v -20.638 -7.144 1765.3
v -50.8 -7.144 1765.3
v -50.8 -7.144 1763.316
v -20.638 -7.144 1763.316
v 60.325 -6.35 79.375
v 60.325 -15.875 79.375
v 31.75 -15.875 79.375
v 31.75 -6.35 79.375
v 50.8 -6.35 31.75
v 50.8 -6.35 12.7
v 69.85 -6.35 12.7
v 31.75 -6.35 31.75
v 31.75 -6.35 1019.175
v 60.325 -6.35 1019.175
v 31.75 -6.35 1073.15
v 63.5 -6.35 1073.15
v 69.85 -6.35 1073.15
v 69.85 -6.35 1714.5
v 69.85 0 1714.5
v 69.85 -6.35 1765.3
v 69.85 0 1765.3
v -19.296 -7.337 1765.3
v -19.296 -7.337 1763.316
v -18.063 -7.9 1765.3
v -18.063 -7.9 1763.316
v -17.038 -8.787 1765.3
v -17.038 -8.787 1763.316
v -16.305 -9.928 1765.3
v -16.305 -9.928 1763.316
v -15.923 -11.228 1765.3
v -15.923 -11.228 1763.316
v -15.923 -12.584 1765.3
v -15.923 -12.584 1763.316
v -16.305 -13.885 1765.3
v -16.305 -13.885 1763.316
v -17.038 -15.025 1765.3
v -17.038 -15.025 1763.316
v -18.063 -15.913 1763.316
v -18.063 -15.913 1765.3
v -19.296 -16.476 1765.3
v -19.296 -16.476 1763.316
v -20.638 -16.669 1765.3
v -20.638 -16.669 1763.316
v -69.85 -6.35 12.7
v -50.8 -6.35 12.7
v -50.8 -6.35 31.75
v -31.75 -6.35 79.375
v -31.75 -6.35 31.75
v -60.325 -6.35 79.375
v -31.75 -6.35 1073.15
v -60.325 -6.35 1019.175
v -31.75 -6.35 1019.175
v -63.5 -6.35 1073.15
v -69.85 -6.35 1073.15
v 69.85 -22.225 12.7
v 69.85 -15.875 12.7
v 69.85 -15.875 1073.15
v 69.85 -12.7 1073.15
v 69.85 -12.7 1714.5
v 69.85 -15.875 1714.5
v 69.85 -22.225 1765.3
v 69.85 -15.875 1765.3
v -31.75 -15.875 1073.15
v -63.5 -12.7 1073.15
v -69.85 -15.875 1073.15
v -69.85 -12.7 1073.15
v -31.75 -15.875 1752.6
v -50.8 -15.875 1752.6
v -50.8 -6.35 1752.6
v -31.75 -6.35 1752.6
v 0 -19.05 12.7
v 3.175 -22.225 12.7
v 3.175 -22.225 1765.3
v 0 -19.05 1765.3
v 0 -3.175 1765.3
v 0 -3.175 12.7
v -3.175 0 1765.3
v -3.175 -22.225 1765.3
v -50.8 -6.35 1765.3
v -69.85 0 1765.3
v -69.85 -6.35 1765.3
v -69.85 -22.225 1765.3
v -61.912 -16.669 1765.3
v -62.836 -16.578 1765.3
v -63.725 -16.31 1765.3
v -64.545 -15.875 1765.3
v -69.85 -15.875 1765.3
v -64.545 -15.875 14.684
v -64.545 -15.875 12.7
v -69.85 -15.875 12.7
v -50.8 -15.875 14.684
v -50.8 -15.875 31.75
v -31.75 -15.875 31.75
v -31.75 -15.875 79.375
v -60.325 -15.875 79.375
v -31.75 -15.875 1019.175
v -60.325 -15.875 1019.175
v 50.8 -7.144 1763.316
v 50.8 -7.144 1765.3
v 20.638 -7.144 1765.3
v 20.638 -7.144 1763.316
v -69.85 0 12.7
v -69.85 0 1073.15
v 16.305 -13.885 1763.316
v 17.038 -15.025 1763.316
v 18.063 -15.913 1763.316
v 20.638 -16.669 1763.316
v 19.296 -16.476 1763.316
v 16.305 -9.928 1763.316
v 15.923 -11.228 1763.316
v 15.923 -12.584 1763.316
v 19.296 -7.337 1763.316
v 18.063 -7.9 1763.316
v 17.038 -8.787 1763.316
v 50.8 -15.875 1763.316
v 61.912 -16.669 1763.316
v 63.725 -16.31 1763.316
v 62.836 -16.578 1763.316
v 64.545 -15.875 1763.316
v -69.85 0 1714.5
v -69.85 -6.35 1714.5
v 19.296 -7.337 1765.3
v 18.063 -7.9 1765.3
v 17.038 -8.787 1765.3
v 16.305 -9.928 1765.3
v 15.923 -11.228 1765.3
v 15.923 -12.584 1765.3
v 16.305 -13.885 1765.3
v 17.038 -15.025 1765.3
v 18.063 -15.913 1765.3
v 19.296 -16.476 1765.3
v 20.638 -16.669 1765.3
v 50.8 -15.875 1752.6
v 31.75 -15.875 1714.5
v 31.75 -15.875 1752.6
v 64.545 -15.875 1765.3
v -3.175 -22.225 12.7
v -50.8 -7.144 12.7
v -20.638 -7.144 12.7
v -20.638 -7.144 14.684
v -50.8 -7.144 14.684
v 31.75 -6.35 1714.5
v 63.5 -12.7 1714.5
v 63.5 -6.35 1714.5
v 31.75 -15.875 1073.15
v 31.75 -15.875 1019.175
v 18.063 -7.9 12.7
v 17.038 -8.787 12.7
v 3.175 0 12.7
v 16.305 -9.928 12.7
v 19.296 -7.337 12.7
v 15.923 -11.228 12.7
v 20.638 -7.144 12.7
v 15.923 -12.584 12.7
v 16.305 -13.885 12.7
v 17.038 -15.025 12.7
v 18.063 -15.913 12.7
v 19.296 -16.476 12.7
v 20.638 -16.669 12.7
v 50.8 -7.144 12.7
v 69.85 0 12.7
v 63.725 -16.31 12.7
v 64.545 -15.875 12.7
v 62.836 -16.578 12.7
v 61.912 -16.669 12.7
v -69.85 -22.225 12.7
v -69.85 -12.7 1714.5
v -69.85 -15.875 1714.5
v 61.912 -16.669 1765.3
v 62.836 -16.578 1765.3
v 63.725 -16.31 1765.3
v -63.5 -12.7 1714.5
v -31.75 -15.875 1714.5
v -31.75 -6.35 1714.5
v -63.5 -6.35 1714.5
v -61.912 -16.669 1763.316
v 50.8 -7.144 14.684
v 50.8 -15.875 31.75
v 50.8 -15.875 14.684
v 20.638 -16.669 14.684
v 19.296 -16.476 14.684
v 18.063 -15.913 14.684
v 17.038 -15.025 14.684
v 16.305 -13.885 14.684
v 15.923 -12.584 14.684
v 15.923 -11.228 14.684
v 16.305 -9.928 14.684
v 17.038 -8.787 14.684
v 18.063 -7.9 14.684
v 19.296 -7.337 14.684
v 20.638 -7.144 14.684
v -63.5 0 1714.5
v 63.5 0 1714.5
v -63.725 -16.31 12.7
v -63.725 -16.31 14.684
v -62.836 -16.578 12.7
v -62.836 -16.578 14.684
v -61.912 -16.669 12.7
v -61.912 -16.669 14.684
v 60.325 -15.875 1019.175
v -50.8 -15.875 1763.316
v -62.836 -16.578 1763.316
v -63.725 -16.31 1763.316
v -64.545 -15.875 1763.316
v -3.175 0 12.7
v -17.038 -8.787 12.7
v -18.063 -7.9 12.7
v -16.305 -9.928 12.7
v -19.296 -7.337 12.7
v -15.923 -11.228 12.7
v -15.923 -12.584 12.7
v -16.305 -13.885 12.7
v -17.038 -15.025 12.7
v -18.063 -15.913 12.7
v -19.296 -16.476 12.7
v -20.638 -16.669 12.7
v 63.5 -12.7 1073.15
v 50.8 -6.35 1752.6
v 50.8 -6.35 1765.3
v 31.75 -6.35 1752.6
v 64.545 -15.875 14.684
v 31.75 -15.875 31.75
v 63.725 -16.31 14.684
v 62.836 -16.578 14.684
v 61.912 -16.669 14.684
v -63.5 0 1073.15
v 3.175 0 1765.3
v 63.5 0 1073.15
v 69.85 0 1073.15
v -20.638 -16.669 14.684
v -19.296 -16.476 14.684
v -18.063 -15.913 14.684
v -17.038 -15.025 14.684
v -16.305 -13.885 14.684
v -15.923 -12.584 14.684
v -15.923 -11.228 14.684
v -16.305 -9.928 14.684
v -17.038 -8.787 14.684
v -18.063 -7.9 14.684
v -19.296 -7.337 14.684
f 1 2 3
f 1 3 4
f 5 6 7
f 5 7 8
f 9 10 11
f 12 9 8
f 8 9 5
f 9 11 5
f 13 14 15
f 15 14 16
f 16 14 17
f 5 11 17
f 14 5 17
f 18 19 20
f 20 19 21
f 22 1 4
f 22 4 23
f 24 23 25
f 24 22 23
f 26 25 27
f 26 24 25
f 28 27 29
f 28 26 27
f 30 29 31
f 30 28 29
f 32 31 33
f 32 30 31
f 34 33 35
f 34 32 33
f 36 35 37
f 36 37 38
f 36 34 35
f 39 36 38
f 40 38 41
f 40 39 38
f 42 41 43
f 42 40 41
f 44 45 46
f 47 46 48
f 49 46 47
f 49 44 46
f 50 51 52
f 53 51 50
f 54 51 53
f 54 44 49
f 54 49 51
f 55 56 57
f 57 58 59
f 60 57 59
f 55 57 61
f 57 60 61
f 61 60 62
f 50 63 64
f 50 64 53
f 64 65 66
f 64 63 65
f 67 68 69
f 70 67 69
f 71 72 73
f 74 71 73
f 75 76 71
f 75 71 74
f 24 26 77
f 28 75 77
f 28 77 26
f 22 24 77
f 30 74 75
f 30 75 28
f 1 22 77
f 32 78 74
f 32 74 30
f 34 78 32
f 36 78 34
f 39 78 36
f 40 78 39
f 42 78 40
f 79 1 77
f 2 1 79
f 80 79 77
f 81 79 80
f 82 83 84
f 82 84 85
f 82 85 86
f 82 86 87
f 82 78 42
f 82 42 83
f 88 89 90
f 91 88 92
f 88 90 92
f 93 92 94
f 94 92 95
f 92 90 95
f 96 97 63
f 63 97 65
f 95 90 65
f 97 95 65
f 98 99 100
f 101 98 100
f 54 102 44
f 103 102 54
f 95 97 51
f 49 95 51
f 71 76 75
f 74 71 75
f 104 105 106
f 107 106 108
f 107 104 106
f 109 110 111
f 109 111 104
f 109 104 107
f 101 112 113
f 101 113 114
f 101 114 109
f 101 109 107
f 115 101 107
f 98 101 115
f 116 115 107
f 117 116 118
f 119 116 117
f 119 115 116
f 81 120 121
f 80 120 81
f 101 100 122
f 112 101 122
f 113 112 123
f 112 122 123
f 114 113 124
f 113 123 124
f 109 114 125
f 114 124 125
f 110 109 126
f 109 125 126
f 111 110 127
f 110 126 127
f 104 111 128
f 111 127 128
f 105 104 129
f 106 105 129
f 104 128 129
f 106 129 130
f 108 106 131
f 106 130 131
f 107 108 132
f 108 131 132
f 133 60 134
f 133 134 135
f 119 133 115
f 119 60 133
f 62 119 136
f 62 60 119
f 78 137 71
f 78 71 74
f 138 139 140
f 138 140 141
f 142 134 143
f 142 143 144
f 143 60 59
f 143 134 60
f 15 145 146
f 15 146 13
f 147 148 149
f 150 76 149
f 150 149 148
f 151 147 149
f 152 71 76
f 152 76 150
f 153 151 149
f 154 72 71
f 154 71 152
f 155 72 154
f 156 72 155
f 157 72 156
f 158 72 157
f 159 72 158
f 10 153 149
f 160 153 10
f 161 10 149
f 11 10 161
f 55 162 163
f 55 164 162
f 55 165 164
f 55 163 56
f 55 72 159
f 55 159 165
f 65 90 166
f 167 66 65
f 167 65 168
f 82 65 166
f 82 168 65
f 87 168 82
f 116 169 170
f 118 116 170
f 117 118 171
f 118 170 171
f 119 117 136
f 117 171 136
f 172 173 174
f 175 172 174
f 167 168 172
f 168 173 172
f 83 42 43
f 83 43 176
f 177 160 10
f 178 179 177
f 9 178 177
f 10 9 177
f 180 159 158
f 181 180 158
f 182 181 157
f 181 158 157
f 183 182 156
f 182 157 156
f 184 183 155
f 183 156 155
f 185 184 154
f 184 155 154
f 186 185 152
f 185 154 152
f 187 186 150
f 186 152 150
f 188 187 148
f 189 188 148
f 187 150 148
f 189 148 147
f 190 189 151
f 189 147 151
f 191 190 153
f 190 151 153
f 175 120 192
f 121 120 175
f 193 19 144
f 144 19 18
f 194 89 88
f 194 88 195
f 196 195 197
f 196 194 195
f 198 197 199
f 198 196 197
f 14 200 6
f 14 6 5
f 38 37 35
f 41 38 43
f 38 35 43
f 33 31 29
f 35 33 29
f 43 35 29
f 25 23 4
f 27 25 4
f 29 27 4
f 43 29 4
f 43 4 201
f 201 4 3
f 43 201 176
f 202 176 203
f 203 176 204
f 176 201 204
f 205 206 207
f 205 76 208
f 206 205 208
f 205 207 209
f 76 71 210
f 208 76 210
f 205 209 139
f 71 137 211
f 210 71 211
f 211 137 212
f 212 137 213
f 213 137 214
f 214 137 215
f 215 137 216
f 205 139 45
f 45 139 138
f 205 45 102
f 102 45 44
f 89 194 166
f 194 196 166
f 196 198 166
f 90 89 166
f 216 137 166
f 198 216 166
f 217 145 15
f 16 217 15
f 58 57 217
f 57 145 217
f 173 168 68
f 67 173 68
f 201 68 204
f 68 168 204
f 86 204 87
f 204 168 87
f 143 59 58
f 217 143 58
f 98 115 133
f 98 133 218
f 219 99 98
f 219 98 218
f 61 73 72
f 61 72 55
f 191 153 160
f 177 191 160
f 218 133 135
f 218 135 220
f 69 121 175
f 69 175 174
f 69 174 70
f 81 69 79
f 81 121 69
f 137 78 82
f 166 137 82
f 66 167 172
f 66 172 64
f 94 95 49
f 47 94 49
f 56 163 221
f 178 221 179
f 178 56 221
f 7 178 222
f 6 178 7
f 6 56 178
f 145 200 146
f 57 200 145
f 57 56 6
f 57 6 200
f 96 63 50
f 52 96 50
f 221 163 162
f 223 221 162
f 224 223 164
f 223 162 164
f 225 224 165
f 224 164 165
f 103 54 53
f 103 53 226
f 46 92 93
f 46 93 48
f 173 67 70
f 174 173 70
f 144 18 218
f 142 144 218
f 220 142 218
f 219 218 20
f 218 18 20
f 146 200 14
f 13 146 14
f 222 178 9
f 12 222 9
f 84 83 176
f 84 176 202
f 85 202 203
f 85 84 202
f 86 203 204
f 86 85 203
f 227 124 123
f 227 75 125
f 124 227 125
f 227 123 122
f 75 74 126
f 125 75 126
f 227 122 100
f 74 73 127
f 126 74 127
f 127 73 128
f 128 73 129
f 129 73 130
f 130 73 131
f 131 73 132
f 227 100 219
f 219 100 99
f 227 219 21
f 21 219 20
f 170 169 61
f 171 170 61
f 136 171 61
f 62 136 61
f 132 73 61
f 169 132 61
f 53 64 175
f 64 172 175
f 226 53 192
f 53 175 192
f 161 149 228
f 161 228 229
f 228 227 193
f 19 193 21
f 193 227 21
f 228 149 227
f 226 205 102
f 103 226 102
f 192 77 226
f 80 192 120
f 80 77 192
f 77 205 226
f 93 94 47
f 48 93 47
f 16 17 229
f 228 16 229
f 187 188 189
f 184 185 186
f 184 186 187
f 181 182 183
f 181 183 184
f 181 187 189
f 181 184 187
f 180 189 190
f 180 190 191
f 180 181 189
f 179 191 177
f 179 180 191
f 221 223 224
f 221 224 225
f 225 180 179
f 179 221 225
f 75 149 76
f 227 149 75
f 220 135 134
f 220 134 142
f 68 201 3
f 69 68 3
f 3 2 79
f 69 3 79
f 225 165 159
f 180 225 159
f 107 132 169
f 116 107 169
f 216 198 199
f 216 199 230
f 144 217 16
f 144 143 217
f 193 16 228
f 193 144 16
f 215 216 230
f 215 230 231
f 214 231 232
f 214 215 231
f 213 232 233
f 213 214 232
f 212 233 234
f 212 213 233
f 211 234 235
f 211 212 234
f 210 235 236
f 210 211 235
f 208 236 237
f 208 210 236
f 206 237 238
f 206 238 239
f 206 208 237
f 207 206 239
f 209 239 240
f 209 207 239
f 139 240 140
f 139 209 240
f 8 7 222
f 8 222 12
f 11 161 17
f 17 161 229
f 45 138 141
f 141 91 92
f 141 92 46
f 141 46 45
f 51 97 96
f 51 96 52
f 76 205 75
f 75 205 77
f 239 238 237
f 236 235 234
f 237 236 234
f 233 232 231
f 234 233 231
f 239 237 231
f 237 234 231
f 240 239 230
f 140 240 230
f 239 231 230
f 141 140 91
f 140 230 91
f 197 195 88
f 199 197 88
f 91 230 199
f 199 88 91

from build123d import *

# Parameters (mm, degrees)
F0_W      = 69.85
F0_H      = 1778
F1_DEPTH  = 22.225
F2_W      = 9.525
F2_H      = 47.625
F2_H_2    = 38.1
F2_H_3    = 53.975
F3_DEPTH  = 38.1
F2_H_4    = 31.75
F2_H_5    = 25.4
F4_DEPTH  = 19.05
F5_W      = 69.85
F5_H      = 12.7
F6_DEPTH  = 22.226
F7_W      = 9.525
F7_H      = 939.8
F8_DEPTH  = 9.525
F11_DEPTH = 1.984375
F12_DEPTH = 1.984375
F13_SIZE  = 3.175
F14_DEPTH = 6.35


with BuildPart() as f1:
    # F0 (on Front) → F1 (new body)
    with BuildSketch(Plane.XZ):
        with Locations((34.925, 889)):
            Rectangle(F0_W, F0_H)
    extrude(amount=F1_DEPTH)

    # F2 (on face) → F3 (cut)
    with BuildSketch(Plane.YZ.offset(69.85)):
        with Locations((-11.1125, 55.5625)):
            Rectangle(F2_W, F2_H)
        with Locations((-11.1125, 1733.55)):
            Rectangle(F2_W, F2_H_2)
        with Locations((-11.1125, 1046.1625)):
            Rectangle(F2_W, F2_H_3)
    extrude(amount=-F3_DEPTH, mode=Mode.SUBTRACT)

    # F2 (on face) → F4 (cut)
    with BuildSketch(Plane.YZ.offset(69.85)):
        with Locations((-11.1125, 15.875)):
            Rectangle(F2_W, F2_H_4)
        with Locations((-11.1125, 1765.3)):
            Rectangle(F2_W, F2_H_5)
    extrude(amount=-F4_DEPTH, mode=Mode.SUBTRACT)

    # F5 (on face) → F6 (cut, through all)
    with BuildSketch(Plane.XZ.offset(22.225)):
        with Locations((34.925, 6.35)):
            Rectangle(F5_W, F5_H)
        with Locations((34.925, 1771.65)):
            Rectangle(F5_W, F5_H)
    extrude(amount=-F6_DEPTH, mode=Mode.SUBTRACT)

    # F7 (on face) → F8 (cut)
    with BuildSketch(Plane.YZ.offset(69.85)):
        with Locations((-11.1125, 549.275)):
            Rectangle(F7_W, F7_H)
    extrude(amount=-F8_DEPTH, mode=Mode.SUBTRACT)

    # F9 (on face) → F11 (cut)
    with BuildSketch(Plane(origin=(0, 0, 12.7), x_dir=(1, 0, 0), z_dir=(0, 0, -1))):
        with BuildLine():
            Line((61.9125, 16.66875), (20.6375, 16.66875))
            ThreePointArc((20.6375, 16.66875), (15.875, 11.90625), (20.6375, 7.14375))
            Line((20.6375, 7.14375), (50.8, 7.14375))
            Line((50.8, 7.14375), (50.8, 15.875))
            Line((50.8, 15.875), (64.545071, 15.875))
            ThreePointArc((64.545071, 15.875), (63.287315, 16.465997), (61.9125, 16.66875))
        make_face()
        with BuildLine():
            Line((50.8, 15.875), (50.8, 7.14375))
            Line((50.8, 7.14375), (61.9125, 7.14375))
            ThreePointArc((61.9125, 7.14375), (66.472247, 10.531435), (64.545071, 15.875))
            Line((64.545071, 15.875), (50.8, 15.875))
        make_face()
    extrude(amount=-F11_DEPTH, mode=Mode.SUBTRACT)

    # F10 (on face) → F12 (cut)
    with BuildSketch(Plane.XY.offset(1765.3)):
        with BuildLine():
            Line((50.8, -7.14375), (20.6375, -7.14375))
            ThreePointArc((20.6375, -7.14375), (15.875, -11.90625), (20.6375, -16.66875))
            Line((20.6375, -16.66875), (61.9125, -16.66875))
            ThreePointArc((61.9125, -16.66875), (63.287315, -16.465997), (64.545071, -15.875))
            Line((64.545071, -15.875), (50.8, -15.875))
            Line((50.8, -15.875), (50.8, -7.14375))
        make_face()
        with BuildLine():
            Line((61.9125, -7.14375), (50.8, -7.14375))
            Line((50.8, -7.14375), (50.8, -15.875))
            Line((50.8, -15.875), (64.545071, -15.875))
            ThreePointArc((64.545071, -15.875), (66.472247, -10.531435), (61.9125, -7.14375))
        make_face()
    extrude(amount=-F12_DEPTH, mode=Mode.SUBTRACT)

    # F13
    f13_edges = [f1.edges().sort_by_distance(p)[0] for p in [
        (0, -22.225, 889),
        (0, 0, 889),
    ]]
    chamfer(f13_edges, length=F13_SIZE)

    # F7 (on face) → F14 (cut)
    with BuildSketch(Plane.YZ.offset(69.85)):
        Polygon((-12.7, 1073.15), (-6.35, 1073.15), (0, 1073.15), (0, 1714.5), (-6.35, 1714.5), (-12.7, 1714.5), align=None)
    extrude(amount=-F14_DEPTH, mode=Mode.SUBTRACT)


with BuildPart() as f15_1:
    # F15: instance of F1
    add(f1.part.mirror(Plane.YZ))


solid = Compound([f1.part, f15_1.part])
